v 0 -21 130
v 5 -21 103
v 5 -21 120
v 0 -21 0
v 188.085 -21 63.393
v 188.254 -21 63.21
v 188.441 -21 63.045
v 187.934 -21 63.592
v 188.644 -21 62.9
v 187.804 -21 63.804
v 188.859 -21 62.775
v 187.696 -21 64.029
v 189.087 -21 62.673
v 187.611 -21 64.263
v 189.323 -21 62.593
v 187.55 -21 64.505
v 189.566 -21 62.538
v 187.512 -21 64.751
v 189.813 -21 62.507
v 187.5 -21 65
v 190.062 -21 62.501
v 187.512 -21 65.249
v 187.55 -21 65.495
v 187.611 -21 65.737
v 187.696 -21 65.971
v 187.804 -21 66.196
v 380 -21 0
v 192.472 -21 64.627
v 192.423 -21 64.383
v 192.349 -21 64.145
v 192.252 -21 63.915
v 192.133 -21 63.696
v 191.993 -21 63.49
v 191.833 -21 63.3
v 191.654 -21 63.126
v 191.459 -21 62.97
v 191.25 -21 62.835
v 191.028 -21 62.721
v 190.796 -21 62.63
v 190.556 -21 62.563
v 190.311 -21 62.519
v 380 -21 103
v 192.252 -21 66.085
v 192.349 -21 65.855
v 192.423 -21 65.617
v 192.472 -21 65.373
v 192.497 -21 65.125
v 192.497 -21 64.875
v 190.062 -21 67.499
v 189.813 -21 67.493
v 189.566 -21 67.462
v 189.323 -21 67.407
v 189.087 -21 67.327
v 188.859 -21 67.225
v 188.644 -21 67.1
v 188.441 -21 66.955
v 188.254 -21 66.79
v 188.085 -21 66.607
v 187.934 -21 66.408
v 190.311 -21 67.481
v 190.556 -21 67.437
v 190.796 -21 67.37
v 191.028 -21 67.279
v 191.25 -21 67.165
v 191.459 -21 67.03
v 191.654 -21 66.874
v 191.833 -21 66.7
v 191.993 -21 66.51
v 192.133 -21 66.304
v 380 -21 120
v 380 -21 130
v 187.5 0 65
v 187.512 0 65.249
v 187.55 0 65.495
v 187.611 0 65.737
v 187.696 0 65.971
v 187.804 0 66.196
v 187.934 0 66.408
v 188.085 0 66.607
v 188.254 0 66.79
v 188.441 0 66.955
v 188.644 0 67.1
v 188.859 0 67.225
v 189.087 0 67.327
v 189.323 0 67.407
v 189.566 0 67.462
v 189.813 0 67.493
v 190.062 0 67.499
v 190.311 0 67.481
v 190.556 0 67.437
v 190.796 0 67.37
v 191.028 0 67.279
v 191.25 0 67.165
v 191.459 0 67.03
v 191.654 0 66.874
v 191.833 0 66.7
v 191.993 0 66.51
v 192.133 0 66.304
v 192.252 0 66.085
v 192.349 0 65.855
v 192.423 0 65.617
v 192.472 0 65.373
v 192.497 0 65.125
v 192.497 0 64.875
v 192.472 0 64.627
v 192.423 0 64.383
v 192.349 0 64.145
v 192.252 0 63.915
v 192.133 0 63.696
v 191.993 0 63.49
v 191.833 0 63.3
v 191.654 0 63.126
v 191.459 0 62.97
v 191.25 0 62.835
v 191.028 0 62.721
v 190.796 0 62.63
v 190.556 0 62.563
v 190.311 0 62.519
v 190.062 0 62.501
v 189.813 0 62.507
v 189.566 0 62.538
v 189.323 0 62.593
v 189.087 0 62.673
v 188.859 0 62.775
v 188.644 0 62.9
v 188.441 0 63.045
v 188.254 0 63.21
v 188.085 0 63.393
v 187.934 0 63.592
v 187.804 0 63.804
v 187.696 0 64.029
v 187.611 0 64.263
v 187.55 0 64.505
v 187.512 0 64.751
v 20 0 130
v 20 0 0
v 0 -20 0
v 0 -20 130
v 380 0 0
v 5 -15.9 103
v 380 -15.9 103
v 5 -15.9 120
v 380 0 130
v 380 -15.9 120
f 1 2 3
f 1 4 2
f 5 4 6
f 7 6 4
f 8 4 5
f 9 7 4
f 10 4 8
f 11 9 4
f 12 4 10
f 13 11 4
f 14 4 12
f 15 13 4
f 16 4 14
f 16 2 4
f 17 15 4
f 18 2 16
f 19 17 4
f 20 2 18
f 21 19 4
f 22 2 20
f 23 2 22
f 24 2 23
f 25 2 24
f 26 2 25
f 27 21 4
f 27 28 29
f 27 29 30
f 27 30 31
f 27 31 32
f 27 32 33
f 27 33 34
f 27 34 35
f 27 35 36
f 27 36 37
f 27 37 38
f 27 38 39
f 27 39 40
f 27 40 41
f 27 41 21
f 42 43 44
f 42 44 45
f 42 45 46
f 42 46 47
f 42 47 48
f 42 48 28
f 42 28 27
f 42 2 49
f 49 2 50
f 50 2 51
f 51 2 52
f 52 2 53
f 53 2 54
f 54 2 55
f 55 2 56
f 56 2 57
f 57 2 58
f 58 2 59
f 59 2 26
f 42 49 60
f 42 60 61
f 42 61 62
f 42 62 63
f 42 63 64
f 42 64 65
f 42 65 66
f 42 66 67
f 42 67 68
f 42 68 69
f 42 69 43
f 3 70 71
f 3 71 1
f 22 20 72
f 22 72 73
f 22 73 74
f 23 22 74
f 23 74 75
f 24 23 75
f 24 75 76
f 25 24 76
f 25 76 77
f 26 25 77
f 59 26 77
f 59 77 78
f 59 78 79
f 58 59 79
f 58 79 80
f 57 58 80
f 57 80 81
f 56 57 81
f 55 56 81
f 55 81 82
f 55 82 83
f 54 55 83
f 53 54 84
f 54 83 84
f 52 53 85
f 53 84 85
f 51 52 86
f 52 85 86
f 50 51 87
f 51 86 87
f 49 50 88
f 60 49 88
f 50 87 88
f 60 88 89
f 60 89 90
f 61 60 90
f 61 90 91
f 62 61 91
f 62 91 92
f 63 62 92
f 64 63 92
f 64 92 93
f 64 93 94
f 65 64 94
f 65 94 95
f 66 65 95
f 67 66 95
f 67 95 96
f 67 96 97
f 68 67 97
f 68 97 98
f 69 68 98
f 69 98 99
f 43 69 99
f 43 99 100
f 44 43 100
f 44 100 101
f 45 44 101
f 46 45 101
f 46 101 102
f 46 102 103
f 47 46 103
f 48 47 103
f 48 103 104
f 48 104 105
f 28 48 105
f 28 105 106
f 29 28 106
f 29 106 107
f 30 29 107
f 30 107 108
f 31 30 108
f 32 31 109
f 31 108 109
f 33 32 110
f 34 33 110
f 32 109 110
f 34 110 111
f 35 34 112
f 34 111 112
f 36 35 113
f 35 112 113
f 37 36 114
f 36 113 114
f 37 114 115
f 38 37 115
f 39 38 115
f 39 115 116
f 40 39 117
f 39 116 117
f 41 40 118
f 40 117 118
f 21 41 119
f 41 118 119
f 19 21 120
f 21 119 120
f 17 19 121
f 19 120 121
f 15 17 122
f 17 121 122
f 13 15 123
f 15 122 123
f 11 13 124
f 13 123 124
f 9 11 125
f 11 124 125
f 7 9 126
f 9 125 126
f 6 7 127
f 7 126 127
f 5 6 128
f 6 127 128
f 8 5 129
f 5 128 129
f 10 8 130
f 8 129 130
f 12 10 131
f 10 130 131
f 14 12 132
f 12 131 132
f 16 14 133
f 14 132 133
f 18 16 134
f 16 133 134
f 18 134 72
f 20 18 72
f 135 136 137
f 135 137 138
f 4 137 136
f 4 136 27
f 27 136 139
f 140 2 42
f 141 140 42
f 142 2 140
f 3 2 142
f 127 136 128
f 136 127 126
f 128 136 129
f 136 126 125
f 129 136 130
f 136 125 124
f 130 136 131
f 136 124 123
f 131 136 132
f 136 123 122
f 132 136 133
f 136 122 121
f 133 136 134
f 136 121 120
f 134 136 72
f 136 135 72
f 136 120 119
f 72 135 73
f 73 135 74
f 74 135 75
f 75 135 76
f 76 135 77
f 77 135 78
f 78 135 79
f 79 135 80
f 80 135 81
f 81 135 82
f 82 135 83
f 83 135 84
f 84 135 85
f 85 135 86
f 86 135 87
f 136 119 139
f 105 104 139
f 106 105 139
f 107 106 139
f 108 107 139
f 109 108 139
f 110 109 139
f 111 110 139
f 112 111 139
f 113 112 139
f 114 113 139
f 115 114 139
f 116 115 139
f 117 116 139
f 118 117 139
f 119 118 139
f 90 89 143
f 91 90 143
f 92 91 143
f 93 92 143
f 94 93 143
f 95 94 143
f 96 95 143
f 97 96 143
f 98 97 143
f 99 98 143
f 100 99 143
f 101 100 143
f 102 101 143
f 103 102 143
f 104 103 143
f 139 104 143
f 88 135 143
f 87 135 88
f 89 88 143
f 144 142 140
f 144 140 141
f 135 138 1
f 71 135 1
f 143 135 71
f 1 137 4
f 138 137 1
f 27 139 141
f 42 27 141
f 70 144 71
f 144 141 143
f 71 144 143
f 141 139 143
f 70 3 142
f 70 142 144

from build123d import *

# Parameters (mm, degrees)
F0_W     = 380
F0_H     = 130
F1_DEPTH = 21
F2_W     = 375
F2_H     = 17
F3_DEPTH = 5.1
F4_SIZE  = 20
F6_D     = 5


with BuildPart() as f1:
    # F0 (on Front) → F1 (new body)
    with BuildSketch(Plane.XZ):
        with Locations((190, 65)):
            Rectangle(F0_W, F0_H)
    extrude(amount=F1_DEPTH)

    # F2 (on face) → F3 (cut, symmetric)
    with BuildSketch(Plane.XZ.offset(21)):
        with Locations((192.5, 111.5)):
            Rectangle(F2_W, F2_H)
    extrude(amount=F3_DEPTH, both=True, mode=Mode.SUBTRACT)

    # F4
    f4_edges = [f1.edges().sort_by_distance(p)[0] for p in [
        (0, 0, 65),
    ]]
    chamfer(f4_edges, length=F4_SIZE)

    # F6 (through all)
    with Locations(Plane.XZ.offset(21)):
        with Locations((190, 65)):
            Hole(F6_D / 2)


solid = f1.part
